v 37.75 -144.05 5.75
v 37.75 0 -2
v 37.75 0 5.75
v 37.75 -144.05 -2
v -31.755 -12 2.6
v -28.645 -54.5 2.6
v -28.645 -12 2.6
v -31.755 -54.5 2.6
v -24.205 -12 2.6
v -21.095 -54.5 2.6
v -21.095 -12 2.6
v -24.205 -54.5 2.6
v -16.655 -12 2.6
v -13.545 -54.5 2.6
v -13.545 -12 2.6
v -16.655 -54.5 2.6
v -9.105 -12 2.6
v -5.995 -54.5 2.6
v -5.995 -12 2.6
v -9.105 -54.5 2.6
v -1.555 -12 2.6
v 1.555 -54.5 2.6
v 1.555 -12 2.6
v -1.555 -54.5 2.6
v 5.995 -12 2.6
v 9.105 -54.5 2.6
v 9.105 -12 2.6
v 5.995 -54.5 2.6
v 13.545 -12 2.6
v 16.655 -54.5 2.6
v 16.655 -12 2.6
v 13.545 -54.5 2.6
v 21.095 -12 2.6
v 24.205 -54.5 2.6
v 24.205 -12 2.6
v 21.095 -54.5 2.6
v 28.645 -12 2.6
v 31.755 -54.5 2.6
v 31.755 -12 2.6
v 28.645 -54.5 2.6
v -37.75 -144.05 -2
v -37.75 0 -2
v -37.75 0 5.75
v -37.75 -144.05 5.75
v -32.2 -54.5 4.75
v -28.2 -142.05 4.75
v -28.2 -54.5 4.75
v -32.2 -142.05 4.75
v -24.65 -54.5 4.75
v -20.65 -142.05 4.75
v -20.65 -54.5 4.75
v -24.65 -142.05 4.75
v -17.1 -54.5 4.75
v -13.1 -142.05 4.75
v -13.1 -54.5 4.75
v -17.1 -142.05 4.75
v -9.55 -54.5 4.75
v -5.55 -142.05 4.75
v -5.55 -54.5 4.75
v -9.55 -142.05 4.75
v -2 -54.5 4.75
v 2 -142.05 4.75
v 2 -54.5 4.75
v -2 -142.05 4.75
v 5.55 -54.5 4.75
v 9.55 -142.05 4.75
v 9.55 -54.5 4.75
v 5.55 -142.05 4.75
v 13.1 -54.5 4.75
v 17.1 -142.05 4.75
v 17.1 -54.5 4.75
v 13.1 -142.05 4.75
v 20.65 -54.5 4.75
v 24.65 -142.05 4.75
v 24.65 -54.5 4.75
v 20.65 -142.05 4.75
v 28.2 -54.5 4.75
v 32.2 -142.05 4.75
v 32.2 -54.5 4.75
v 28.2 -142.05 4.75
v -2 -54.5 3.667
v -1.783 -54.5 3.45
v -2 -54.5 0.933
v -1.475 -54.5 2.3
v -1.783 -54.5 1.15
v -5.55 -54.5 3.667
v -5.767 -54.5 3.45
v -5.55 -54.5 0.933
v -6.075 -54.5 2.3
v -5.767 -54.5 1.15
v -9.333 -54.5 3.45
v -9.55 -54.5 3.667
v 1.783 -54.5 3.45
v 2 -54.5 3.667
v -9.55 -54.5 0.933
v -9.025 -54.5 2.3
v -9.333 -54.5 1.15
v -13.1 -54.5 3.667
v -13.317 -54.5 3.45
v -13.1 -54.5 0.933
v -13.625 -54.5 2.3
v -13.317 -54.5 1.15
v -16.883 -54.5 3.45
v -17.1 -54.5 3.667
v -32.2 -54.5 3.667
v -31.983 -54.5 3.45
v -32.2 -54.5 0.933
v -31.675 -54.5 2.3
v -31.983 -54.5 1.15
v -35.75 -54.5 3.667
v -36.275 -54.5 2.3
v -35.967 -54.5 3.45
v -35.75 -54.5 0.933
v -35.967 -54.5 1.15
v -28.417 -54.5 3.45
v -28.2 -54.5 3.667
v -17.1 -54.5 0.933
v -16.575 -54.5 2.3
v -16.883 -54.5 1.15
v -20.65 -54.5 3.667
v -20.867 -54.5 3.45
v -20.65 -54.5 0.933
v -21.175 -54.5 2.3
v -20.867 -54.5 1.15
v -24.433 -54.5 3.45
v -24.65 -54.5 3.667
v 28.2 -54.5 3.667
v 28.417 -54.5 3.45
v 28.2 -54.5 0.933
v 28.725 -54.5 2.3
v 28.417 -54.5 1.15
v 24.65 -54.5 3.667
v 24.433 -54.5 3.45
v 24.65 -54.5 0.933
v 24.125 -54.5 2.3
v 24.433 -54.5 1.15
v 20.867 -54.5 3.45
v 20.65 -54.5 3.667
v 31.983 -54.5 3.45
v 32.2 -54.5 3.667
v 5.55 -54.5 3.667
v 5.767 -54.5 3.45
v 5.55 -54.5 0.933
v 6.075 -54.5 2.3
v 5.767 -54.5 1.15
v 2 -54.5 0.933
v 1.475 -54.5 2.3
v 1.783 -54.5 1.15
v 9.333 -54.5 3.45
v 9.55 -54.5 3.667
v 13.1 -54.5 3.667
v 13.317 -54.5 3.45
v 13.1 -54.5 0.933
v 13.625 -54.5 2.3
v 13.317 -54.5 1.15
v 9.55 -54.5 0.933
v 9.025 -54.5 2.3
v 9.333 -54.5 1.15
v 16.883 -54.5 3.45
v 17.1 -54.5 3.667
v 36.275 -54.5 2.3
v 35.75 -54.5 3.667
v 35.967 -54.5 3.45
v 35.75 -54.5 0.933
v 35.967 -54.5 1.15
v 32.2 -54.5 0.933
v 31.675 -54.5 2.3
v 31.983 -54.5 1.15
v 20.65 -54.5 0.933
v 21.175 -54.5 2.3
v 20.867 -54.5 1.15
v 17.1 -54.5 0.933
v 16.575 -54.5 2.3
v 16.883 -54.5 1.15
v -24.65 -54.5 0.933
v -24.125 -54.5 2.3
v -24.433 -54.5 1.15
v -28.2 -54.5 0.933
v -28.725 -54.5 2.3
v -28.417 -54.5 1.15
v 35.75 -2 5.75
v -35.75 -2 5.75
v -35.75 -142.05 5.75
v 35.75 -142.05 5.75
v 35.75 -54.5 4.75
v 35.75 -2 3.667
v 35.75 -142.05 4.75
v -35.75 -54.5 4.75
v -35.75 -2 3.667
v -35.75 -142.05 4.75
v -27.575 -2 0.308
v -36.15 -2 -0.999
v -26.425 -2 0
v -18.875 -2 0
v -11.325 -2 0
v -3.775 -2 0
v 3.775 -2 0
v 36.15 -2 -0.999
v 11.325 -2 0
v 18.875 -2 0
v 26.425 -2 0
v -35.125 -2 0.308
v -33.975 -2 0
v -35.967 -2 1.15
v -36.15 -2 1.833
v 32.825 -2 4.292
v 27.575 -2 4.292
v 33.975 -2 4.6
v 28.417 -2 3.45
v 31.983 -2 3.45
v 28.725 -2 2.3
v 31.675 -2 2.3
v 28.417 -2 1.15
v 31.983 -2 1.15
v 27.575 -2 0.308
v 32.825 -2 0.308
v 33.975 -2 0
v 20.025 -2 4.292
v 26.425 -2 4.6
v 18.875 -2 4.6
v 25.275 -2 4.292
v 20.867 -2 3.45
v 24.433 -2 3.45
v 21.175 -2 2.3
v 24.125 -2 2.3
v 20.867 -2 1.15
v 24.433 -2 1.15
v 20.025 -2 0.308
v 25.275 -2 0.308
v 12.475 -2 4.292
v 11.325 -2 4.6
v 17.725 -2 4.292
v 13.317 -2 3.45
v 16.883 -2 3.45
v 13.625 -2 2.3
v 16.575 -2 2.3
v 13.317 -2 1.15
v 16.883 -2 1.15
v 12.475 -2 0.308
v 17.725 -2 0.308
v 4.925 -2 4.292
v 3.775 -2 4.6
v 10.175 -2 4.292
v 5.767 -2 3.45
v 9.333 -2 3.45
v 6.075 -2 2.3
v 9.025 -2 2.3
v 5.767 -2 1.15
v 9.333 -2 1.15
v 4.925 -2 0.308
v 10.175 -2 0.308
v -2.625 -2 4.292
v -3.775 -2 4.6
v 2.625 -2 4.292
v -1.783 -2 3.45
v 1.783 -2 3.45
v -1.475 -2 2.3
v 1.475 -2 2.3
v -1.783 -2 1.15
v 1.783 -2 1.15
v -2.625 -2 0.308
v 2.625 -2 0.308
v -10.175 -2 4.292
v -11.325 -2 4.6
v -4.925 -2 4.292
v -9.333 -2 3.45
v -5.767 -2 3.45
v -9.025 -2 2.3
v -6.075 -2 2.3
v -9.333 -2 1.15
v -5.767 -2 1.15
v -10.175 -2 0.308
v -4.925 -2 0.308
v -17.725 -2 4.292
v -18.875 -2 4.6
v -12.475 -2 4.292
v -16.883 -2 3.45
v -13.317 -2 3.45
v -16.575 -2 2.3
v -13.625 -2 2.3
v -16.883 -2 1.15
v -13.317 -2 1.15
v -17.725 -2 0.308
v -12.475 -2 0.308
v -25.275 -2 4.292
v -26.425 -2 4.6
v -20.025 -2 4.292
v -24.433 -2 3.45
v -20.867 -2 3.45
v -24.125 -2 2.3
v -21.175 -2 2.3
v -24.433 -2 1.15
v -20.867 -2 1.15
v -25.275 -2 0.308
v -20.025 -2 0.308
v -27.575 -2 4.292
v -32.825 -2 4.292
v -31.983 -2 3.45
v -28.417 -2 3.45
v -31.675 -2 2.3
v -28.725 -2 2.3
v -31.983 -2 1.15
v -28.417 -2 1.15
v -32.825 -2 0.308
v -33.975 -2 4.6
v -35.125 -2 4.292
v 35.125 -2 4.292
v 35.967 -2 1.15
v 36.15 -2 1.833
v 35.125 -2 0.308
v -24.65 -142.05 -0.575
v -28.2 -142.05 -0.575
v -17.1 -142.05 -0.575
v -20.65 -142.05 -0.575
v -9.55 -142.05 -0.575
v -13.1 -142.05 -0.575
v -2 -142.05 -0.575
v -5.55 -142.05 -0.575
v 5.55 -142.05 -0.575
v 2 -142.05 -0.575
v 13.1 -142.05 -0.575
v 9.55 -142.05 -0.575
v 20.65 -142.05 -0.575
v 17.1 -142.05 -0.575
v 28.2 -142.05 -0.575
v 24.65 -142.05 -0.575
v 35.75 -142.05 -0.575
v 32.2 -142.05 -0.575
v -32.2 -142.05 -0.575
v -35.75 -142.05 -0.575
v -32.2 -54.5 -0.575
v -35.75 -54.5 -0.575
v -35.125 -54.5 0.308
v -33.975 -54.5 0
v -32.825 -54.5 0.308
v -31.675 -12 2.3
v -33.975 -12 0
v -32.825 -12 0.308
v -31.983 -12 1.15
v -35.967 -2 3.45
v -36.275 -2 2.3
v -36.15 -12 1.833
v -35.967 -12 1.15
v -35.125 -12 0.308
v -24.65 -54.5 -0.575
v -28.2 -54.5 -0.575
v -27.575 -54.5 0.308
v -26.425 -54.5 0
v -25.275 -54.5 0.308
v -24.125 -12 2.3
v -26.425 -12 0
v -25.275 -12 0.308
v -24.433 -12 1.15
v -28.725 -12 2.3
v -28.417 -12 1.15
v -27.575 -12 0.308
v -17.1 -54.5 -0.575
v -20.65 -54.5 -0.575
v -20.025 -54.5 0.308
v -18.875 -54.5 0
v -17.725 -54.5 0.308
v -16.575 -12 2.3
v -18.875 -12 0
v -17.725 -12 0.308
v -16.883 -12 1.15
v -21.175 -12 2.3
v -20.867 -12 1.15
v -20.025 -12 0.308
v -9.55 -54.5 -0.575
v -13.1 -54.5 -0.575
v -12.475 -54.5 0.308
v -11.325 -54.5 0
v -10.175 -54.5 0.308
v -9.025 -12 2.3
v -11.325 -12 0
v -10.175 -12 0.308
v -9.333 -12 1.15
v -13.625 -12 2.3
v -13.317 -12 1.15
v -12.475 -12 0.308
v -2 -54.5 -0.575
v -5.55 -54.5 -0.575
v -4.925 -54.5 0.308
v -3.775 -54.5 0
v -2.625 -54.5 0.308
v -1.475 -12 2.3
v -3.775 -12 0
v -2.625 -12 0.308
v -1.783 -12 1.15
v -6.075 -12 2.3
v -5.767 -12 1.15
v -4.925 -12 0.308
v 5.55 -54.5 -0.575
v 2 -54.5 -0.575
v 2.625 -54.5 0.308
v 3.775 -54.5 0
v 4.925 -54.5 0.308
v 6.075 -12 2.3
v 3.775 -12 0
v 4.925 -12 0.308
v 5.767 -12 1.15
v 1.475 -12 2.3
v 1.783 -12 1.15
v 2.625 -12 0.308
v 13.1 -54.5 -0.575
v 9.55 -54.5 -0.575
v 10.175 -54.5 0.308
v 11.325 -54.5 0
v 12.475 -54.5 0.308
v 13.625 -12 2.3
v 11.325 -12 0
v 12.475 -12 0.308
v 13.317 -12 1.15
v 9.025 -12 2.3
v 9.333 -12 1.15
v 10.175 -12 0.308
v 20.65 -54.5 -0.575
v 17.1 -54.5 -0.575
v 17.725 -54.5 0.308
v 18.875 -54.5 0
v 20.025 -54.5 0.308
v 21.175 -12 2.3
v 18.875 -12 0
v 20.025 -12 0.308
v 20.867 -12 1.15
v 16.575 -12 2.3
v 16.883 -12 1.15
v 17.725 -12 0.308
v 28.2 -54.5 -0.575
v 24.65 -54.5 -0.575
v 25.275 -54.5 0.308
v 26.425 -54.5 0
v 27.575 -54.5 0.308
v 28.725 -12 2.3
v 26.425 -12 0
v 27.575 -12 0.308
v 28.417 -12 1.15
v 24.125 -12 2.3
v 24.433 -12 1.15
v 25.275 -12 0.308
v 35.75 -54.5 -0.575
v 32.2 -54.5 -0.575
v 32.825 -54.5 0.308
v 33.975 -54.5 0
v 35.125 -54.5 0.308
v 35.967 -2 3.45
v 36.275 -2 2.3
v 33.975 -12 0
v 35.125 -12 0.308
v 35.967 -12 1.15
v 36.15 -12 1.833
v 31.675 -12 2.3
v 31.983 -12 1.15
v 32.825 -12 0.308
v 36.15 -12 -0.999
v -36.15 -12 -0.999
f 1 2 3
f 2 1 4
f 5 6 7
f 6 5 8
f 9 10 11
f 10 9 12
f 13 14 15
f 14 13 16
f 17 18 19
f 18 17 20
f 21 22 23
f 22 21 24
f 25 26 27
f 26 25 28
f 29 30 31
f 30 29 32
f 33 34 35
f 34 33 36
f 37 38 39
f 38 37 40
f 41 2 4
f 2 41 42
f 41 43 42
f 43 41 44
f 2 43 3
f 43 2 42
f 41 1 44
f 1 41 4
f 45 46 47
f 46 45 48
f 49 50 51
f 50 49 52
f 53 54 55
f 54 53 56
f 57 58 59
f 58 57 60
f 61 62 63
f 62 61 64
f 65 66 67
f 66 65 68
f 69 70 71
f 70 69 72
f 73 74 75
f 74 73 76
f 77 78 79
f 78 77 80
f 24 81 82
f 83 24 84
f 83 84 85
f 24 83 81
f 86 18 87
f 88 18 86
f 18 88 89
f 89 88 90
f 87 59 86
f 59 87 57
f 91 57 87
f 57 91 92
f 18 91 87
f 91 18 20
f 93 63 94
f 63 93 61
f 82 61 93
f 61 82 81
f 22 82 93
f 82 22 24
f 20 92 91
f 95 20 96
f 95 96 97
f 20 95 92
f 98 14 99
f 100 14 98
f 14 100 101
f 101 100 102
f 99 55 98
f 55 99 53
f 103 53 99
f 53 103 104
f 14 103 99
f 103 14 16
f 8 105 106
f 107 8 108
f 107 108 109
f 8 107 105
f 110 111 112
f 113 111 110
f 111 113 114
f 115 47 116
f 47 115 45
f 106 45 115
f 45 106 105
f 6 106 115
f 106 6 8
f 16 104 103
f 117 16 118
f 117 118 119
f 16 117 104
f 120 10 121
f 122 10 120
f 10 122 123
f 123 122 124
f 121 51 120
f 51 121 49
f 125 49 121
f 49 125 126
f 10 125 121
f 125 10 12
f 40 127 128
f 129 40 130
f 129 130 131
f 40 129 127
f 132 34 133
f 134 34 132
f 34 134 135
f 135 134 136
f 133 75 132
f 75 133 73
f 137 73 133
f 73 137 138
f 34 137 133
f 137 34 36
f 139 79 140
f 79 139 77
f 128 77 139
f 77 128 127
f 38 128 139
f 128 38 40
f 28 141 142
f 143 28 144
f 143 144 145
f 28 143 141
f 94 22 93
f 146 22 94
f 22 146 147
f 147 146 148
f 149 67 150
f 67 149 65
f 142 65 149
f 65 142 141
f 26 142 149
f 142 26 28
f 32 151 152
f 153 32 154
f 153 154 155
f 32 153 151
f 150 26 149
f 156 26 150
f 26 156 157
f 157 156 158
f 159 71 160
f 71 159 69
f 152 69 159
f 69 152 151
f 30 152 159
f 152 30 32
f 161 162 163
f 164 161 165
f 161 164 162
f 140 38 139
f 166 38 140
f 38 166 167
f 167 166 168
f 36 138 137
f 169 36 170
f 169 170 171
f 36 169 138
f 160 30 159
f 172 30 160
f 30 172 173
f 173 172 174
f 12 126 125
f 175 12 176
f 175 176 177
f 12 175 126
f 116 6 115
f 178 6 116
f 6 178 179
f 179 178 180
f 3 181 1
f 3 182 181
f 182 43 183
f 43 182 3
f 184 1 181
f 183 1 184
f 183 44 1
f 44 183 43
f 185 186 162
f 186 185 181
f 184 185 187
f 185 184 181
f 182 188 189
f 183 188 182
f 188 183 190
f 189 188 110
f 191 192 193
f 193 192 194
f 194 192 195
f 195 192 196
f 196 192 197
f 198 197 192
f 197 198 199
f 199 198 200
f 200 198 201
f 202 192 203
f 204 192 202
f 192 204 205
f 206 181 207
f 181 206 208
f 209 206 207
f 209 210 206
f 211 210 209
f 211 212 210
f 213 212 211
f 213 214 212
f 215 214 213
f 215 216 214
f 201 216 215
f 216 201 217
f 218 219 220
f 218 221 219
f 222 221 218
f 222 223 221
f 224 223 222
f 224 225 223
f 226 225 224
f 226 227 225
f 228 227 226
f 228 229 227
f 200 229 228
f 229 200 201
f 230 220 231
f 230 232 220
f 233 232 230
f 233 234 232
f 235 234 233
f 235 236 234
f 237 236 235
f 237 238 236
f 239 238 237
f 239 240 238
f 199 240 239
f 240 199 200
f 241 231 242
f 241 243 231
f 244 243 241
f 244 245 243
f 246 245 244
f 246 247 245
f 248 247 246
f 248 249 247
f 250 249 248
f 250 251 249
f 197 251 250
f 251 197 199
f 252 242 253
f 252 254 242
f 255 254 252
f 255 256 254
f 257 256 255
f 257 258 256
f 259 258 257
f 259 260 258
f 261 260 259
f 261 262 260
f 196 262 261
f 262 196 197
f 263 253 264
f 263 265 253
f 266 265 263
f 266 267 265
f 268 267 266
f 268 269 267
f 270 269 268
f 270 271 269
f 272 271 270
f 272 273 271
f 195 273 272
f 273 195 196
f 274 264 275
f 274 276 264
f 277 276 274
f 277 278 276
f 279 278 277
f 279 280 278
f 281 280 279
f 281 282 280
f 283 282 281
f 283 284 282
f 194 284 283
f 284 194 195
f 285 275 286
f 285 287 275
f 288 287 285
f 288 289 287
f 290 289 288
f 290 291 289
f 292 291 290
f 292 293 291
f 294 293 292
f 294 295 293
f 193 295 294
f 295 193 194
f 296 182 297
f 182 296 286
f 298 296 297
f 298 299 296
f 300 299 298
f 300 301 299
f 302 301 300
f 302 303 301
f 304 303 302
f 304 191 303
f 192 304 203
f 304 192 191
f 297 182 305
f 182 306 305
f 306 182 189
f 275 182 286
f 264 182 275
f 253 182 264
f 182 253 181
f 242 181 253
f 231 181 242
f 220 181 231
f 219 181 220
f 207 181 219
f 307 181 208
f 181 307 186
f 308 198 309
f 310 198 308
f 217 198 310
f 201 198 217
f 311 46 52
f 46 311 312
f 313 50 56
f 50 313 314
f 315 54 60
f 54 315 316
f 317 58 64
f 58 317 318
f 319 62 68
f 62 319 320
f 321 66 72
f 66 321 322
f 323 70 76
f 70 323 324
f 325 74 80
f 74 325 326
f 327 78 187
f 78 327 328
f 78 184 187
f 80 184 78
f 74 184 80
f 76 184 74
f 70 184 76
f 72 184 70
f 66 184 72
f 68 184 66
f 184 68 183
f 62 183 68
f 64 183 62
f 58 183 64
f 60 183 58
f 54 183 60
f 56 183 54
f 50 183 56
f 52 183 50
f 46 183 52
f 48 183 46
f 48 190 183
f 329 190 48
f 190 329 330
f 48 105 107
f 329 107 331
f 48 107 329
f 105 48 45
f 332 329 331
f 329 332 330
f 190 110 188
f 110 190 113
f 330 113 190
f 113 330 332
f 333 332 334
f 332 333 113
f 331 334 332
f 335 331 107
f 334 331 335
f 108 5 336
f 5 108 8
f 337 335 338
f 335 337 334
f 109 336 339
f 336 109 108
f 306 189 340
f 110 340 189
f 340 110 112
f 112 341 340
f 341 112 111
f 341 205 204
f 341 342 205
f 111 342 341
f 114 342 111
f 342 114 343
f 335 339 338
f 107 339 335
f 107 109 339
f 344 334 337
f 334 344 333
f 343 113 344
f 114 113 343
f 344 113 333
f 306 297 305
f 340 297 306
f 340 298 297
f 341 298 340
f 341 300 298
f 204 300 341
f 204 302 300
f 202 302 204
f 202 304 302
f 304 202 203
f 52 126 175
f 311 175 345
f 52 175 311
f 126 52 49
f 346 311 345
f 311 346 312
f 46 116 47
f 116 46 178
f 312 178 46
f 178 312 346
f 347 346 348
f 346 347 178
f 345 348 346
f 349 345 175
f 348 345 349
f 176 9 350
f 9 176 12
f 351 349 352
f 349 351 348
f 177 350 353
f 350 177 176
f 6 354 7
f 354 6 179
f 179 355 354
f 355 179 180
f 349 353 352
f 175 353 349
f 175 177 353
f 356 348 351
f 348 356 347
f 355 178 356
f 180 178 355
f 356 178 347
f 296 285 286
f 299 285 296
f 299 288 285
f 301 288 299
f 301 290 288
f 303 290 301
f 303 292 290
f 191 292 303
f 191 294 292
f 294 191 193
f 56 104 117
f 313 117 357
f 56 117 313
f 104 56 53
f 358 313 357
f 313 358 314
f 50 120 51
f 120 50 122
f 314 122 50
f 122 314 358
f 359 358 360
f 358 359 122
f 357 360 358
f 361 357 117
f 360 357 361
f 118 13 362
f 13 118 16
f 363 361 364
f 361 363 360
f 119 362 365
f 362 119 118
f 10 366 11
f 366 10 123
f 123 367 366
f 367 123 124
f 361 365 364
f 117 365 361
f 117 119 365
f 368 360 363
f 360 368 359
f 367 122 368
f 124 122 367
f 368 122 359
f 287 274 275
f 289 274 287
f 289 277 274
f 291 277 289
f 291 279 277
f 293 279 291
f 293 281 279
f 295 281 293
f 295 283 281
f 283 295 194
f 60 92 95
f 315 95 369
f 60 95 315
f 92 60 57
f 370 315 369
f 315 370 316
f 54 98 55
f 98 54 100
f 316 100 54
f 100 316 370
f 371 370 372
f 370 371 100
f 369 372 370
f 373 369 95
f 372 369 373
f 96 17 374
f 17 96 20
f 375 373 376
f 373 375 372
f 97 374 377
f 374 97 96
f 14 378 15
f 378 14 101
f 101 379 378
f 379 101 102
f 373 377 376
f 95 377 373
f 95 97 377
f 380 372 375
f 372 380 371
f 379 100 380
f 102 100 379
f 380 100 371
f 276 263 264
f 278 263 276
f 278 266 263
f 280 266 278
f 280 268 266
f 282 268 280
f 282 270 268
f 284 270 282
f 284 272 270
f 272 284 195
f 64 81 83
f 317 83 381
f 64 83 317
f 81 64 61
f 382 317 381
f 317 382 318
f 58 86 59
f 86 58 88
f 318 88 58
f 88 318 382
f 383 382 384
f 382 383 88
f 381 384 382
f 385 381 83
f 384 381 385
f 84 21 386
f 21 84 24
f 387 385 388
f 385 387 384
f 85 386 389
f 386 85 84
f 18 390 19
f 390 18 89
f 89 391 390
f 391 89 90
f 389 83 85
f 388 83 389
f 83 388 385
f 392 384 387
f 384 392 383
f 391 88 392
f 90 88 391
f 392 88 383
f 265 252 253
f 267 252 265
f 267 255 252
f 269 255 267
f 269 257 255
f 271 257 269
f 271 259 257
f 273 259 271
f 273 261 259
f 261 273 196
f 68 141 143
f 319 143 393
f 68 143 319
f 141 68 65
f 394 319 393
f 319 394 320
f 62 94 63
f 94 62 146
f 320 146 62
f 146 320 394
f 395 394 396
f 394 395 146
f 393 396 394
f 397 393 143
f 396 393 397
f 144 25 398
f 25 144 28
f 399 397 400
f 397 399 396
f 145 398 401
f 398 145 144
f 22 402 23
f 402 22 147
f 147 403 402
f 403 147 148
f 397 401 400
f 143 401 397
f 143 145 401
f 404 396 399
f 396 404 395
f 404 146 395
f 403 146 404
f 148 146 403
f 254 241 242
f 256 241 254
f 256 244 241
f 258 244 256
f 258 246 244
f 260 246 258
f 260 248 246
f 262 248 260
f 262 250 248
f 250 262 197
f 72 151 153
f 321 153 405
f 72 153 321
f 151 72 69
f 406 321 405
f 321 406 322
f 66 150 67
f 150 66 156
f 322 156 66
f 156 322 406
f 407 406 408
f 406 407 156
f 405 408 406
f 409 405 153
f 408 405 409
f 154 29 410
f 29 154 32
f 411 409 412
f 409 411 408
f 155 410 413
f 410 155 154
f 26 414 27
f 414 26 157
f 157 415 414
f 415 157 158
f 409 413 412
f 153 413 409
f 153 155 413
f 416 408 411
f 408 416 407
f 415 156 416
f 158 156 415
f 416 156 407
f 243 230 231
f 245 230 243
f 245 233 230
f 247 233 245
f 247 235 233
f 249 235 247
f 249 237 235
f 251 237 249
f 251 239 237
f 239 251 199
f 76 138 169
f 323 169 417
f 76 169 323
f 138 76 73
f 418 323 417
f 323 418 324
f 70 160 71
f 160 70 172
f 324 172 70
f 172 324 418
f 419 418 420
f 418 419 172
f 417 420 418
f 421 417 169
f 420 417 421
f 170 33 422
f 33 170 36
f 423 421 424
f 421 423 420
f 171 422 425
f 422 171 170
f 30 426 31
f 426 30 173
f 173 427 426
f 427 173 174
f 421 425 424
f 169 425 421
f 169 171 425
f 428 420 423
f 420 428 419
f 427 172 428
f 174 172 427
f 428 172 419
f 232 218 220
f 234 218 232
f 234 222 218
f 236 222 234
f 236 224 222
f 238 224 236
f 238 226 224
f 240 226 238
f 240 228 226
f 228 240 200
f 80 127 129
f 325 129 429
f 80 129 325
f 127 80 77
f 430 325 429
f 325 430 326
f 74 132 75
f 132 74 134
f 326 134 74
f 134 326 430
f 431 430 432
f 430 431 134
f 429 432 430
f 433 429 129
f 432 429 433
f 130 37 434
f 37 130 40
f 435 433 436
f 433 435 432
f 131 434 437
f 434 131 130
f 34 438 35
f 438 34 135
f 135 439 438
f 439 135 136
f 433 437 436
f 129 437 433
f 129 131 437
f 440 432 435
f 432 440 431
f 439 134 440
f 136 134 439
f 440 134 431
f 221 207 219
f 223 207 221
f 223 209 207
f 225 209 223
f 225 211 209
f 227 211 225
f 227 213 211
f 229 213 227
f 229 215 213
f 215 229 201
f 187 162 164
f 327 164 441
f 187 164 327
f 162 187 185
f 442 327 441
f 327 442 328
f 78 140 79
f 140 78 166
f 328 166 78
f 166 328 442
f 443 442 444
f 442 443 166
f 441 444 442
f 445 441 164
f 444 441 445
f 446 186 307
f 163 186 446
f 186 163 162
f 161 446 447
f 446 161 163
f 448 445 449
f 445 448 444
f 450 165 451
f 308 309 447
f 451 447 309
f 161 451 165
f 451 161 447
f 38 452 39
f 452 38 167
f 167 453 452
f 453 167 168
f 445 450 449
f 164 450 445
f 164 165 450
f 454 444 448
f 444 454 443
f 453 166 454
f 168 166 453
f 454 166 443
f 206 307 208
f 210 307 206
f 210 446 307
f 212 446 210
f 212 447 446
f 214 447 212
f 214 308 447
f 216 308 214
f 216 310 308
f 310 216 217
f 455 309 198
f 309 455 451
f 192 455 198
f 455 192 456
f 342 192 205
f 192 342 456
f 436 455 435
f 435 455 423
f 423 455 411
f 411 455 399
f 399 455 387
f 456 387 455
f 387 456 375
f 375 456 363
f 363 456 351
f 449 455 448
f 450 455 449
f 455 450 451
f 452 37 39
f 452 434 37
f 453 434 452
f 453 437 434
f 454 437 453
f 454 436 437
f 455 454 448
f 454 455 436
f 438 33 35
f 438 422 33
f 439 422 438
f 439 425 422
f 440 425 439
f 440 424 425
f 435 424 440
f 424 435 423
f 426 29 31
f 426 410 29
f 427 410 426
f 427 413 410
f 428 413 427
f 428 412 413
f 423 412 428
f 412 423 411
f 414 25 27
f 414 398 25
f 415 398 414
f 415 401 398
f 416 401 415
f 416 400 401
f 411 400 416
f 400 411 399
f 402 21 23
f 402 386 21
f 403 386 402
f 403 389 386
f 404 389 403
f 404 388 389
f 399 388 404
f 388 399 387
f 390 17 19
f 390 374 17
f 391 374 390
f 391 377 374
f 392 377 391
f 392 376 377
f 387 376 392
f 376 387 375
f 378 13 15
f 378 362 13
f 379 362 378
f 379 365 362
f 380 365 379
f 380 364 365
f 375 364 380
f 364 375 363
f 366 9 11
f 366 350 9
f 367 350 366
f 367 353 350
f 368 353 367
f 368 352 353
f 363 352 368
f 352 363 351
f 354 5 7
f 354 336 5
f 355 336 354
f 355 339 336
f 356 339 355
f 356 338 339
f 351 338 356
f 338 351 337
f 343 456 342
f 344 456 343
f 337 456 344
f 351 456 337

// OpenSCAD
//Facet Number
$fn = 12;

// Handle Parameters
// The diameter of the handle
handle_diameter = 4.6; // [0:0.1:15]
// The depth/length of the handle
handle_depth = 52.5; // [0:0.1:140]

// File parameters
// File width
file_blade_width = 3.55; // [0:0.1:8]
// File height
file_blade_height = 5.75; // [0:0.1:10]
// File depth
file_blade_depth = 87.55; // [0:0.1:140]

// File spacing
file_spacing = 4; // [0:0.1:10]

// File number
file_number = 10; // [1:1:20]

// Define parameters for the box
// Offset to ensure the file is fully subtracted from the box
box_offset = 4.0;
// Width of the box
box_base_width = (file_blade_width + box_offset) * file_number;
// Depth of the box
box_base_depth = file_blade_depth + handle_depth + box_offset;
// Height of the box
box_base_height = handle_diameter;

module handle() {
  rotate(a=[90, 0, 0])
    translate([0, 0, handle_depth / 2])
      cylinder(d=handle_diameter, h=handle_depth + 0.001, center=true);
}

module file_blade() {
  translate(v=[0, -file_blade_depth / 2, 0])
    translate(v=[0, -handle_depth, 0])
      cube(size=[file_blade_width, file_blade_depth, file_blade_height], center=true);
}

module file_body() {
  union() {
    file_blade();
    handle();
  }
}

module box() {

  // color("lightblue")
  // Create the parametric box
  union() {
    translate(v=[0, -box_base_depth / 2, (box_base_height / 2) - (box_offset / 2)])
      cube([box_base_width, box_base_depth, box_base_height], center=true);
    translate(v=[0, -box_base_depth / 2, ( (file_blade_height + box_offset / 4) / 2) - (box_offset / 2)])
      translate(v=[0, -(handle_depth / 2) - (box_offset / 4), 0])
        cube([box_base_width, -0.001 + file_blade_depth + box_offset / 2, file_blade_height + box_offset / 4], center=true);
  }
  difference() {
    // color("lightblue")
    translate(v=[0, -box_base_depth / 2, 0.5 + ( (file_blade_height + box_offset / 4) / 2) - (box_offset / 2)])
      cube(size=[box_base_width, box_base_depth, 1 + file_blade_height + box_offset / 4], center=true);
    // color("blue")
    translate(v=[0, -box_base_depth / 2, ( (file_blade_height + box_offset / 4) / 2) - (box_offset / 2)])
      cube(size=[box_base_width - box_offset, box_base_depth - box_offset, 2.001 + file_blade_height + box_offset / 4], center=true);
  }
}

difference() {
  box();
  // Space to push with fingers
  translate(v=[0, -7, 0.501 + (box_base_height / 2) - (box_offset / 2)])
    cube(size=[box_base_width - box_offset + 0.8, 10, box_base_height - 1], center=true);
  // Position and array the files
  for (i = [0:file_number - 1]) {
    translate(v=[(i - (file_number - 1) / 2) * (file_blade_width + file_spacing), -box_offset / 2, box_base_height / 2])
      file_body();
  }
}
